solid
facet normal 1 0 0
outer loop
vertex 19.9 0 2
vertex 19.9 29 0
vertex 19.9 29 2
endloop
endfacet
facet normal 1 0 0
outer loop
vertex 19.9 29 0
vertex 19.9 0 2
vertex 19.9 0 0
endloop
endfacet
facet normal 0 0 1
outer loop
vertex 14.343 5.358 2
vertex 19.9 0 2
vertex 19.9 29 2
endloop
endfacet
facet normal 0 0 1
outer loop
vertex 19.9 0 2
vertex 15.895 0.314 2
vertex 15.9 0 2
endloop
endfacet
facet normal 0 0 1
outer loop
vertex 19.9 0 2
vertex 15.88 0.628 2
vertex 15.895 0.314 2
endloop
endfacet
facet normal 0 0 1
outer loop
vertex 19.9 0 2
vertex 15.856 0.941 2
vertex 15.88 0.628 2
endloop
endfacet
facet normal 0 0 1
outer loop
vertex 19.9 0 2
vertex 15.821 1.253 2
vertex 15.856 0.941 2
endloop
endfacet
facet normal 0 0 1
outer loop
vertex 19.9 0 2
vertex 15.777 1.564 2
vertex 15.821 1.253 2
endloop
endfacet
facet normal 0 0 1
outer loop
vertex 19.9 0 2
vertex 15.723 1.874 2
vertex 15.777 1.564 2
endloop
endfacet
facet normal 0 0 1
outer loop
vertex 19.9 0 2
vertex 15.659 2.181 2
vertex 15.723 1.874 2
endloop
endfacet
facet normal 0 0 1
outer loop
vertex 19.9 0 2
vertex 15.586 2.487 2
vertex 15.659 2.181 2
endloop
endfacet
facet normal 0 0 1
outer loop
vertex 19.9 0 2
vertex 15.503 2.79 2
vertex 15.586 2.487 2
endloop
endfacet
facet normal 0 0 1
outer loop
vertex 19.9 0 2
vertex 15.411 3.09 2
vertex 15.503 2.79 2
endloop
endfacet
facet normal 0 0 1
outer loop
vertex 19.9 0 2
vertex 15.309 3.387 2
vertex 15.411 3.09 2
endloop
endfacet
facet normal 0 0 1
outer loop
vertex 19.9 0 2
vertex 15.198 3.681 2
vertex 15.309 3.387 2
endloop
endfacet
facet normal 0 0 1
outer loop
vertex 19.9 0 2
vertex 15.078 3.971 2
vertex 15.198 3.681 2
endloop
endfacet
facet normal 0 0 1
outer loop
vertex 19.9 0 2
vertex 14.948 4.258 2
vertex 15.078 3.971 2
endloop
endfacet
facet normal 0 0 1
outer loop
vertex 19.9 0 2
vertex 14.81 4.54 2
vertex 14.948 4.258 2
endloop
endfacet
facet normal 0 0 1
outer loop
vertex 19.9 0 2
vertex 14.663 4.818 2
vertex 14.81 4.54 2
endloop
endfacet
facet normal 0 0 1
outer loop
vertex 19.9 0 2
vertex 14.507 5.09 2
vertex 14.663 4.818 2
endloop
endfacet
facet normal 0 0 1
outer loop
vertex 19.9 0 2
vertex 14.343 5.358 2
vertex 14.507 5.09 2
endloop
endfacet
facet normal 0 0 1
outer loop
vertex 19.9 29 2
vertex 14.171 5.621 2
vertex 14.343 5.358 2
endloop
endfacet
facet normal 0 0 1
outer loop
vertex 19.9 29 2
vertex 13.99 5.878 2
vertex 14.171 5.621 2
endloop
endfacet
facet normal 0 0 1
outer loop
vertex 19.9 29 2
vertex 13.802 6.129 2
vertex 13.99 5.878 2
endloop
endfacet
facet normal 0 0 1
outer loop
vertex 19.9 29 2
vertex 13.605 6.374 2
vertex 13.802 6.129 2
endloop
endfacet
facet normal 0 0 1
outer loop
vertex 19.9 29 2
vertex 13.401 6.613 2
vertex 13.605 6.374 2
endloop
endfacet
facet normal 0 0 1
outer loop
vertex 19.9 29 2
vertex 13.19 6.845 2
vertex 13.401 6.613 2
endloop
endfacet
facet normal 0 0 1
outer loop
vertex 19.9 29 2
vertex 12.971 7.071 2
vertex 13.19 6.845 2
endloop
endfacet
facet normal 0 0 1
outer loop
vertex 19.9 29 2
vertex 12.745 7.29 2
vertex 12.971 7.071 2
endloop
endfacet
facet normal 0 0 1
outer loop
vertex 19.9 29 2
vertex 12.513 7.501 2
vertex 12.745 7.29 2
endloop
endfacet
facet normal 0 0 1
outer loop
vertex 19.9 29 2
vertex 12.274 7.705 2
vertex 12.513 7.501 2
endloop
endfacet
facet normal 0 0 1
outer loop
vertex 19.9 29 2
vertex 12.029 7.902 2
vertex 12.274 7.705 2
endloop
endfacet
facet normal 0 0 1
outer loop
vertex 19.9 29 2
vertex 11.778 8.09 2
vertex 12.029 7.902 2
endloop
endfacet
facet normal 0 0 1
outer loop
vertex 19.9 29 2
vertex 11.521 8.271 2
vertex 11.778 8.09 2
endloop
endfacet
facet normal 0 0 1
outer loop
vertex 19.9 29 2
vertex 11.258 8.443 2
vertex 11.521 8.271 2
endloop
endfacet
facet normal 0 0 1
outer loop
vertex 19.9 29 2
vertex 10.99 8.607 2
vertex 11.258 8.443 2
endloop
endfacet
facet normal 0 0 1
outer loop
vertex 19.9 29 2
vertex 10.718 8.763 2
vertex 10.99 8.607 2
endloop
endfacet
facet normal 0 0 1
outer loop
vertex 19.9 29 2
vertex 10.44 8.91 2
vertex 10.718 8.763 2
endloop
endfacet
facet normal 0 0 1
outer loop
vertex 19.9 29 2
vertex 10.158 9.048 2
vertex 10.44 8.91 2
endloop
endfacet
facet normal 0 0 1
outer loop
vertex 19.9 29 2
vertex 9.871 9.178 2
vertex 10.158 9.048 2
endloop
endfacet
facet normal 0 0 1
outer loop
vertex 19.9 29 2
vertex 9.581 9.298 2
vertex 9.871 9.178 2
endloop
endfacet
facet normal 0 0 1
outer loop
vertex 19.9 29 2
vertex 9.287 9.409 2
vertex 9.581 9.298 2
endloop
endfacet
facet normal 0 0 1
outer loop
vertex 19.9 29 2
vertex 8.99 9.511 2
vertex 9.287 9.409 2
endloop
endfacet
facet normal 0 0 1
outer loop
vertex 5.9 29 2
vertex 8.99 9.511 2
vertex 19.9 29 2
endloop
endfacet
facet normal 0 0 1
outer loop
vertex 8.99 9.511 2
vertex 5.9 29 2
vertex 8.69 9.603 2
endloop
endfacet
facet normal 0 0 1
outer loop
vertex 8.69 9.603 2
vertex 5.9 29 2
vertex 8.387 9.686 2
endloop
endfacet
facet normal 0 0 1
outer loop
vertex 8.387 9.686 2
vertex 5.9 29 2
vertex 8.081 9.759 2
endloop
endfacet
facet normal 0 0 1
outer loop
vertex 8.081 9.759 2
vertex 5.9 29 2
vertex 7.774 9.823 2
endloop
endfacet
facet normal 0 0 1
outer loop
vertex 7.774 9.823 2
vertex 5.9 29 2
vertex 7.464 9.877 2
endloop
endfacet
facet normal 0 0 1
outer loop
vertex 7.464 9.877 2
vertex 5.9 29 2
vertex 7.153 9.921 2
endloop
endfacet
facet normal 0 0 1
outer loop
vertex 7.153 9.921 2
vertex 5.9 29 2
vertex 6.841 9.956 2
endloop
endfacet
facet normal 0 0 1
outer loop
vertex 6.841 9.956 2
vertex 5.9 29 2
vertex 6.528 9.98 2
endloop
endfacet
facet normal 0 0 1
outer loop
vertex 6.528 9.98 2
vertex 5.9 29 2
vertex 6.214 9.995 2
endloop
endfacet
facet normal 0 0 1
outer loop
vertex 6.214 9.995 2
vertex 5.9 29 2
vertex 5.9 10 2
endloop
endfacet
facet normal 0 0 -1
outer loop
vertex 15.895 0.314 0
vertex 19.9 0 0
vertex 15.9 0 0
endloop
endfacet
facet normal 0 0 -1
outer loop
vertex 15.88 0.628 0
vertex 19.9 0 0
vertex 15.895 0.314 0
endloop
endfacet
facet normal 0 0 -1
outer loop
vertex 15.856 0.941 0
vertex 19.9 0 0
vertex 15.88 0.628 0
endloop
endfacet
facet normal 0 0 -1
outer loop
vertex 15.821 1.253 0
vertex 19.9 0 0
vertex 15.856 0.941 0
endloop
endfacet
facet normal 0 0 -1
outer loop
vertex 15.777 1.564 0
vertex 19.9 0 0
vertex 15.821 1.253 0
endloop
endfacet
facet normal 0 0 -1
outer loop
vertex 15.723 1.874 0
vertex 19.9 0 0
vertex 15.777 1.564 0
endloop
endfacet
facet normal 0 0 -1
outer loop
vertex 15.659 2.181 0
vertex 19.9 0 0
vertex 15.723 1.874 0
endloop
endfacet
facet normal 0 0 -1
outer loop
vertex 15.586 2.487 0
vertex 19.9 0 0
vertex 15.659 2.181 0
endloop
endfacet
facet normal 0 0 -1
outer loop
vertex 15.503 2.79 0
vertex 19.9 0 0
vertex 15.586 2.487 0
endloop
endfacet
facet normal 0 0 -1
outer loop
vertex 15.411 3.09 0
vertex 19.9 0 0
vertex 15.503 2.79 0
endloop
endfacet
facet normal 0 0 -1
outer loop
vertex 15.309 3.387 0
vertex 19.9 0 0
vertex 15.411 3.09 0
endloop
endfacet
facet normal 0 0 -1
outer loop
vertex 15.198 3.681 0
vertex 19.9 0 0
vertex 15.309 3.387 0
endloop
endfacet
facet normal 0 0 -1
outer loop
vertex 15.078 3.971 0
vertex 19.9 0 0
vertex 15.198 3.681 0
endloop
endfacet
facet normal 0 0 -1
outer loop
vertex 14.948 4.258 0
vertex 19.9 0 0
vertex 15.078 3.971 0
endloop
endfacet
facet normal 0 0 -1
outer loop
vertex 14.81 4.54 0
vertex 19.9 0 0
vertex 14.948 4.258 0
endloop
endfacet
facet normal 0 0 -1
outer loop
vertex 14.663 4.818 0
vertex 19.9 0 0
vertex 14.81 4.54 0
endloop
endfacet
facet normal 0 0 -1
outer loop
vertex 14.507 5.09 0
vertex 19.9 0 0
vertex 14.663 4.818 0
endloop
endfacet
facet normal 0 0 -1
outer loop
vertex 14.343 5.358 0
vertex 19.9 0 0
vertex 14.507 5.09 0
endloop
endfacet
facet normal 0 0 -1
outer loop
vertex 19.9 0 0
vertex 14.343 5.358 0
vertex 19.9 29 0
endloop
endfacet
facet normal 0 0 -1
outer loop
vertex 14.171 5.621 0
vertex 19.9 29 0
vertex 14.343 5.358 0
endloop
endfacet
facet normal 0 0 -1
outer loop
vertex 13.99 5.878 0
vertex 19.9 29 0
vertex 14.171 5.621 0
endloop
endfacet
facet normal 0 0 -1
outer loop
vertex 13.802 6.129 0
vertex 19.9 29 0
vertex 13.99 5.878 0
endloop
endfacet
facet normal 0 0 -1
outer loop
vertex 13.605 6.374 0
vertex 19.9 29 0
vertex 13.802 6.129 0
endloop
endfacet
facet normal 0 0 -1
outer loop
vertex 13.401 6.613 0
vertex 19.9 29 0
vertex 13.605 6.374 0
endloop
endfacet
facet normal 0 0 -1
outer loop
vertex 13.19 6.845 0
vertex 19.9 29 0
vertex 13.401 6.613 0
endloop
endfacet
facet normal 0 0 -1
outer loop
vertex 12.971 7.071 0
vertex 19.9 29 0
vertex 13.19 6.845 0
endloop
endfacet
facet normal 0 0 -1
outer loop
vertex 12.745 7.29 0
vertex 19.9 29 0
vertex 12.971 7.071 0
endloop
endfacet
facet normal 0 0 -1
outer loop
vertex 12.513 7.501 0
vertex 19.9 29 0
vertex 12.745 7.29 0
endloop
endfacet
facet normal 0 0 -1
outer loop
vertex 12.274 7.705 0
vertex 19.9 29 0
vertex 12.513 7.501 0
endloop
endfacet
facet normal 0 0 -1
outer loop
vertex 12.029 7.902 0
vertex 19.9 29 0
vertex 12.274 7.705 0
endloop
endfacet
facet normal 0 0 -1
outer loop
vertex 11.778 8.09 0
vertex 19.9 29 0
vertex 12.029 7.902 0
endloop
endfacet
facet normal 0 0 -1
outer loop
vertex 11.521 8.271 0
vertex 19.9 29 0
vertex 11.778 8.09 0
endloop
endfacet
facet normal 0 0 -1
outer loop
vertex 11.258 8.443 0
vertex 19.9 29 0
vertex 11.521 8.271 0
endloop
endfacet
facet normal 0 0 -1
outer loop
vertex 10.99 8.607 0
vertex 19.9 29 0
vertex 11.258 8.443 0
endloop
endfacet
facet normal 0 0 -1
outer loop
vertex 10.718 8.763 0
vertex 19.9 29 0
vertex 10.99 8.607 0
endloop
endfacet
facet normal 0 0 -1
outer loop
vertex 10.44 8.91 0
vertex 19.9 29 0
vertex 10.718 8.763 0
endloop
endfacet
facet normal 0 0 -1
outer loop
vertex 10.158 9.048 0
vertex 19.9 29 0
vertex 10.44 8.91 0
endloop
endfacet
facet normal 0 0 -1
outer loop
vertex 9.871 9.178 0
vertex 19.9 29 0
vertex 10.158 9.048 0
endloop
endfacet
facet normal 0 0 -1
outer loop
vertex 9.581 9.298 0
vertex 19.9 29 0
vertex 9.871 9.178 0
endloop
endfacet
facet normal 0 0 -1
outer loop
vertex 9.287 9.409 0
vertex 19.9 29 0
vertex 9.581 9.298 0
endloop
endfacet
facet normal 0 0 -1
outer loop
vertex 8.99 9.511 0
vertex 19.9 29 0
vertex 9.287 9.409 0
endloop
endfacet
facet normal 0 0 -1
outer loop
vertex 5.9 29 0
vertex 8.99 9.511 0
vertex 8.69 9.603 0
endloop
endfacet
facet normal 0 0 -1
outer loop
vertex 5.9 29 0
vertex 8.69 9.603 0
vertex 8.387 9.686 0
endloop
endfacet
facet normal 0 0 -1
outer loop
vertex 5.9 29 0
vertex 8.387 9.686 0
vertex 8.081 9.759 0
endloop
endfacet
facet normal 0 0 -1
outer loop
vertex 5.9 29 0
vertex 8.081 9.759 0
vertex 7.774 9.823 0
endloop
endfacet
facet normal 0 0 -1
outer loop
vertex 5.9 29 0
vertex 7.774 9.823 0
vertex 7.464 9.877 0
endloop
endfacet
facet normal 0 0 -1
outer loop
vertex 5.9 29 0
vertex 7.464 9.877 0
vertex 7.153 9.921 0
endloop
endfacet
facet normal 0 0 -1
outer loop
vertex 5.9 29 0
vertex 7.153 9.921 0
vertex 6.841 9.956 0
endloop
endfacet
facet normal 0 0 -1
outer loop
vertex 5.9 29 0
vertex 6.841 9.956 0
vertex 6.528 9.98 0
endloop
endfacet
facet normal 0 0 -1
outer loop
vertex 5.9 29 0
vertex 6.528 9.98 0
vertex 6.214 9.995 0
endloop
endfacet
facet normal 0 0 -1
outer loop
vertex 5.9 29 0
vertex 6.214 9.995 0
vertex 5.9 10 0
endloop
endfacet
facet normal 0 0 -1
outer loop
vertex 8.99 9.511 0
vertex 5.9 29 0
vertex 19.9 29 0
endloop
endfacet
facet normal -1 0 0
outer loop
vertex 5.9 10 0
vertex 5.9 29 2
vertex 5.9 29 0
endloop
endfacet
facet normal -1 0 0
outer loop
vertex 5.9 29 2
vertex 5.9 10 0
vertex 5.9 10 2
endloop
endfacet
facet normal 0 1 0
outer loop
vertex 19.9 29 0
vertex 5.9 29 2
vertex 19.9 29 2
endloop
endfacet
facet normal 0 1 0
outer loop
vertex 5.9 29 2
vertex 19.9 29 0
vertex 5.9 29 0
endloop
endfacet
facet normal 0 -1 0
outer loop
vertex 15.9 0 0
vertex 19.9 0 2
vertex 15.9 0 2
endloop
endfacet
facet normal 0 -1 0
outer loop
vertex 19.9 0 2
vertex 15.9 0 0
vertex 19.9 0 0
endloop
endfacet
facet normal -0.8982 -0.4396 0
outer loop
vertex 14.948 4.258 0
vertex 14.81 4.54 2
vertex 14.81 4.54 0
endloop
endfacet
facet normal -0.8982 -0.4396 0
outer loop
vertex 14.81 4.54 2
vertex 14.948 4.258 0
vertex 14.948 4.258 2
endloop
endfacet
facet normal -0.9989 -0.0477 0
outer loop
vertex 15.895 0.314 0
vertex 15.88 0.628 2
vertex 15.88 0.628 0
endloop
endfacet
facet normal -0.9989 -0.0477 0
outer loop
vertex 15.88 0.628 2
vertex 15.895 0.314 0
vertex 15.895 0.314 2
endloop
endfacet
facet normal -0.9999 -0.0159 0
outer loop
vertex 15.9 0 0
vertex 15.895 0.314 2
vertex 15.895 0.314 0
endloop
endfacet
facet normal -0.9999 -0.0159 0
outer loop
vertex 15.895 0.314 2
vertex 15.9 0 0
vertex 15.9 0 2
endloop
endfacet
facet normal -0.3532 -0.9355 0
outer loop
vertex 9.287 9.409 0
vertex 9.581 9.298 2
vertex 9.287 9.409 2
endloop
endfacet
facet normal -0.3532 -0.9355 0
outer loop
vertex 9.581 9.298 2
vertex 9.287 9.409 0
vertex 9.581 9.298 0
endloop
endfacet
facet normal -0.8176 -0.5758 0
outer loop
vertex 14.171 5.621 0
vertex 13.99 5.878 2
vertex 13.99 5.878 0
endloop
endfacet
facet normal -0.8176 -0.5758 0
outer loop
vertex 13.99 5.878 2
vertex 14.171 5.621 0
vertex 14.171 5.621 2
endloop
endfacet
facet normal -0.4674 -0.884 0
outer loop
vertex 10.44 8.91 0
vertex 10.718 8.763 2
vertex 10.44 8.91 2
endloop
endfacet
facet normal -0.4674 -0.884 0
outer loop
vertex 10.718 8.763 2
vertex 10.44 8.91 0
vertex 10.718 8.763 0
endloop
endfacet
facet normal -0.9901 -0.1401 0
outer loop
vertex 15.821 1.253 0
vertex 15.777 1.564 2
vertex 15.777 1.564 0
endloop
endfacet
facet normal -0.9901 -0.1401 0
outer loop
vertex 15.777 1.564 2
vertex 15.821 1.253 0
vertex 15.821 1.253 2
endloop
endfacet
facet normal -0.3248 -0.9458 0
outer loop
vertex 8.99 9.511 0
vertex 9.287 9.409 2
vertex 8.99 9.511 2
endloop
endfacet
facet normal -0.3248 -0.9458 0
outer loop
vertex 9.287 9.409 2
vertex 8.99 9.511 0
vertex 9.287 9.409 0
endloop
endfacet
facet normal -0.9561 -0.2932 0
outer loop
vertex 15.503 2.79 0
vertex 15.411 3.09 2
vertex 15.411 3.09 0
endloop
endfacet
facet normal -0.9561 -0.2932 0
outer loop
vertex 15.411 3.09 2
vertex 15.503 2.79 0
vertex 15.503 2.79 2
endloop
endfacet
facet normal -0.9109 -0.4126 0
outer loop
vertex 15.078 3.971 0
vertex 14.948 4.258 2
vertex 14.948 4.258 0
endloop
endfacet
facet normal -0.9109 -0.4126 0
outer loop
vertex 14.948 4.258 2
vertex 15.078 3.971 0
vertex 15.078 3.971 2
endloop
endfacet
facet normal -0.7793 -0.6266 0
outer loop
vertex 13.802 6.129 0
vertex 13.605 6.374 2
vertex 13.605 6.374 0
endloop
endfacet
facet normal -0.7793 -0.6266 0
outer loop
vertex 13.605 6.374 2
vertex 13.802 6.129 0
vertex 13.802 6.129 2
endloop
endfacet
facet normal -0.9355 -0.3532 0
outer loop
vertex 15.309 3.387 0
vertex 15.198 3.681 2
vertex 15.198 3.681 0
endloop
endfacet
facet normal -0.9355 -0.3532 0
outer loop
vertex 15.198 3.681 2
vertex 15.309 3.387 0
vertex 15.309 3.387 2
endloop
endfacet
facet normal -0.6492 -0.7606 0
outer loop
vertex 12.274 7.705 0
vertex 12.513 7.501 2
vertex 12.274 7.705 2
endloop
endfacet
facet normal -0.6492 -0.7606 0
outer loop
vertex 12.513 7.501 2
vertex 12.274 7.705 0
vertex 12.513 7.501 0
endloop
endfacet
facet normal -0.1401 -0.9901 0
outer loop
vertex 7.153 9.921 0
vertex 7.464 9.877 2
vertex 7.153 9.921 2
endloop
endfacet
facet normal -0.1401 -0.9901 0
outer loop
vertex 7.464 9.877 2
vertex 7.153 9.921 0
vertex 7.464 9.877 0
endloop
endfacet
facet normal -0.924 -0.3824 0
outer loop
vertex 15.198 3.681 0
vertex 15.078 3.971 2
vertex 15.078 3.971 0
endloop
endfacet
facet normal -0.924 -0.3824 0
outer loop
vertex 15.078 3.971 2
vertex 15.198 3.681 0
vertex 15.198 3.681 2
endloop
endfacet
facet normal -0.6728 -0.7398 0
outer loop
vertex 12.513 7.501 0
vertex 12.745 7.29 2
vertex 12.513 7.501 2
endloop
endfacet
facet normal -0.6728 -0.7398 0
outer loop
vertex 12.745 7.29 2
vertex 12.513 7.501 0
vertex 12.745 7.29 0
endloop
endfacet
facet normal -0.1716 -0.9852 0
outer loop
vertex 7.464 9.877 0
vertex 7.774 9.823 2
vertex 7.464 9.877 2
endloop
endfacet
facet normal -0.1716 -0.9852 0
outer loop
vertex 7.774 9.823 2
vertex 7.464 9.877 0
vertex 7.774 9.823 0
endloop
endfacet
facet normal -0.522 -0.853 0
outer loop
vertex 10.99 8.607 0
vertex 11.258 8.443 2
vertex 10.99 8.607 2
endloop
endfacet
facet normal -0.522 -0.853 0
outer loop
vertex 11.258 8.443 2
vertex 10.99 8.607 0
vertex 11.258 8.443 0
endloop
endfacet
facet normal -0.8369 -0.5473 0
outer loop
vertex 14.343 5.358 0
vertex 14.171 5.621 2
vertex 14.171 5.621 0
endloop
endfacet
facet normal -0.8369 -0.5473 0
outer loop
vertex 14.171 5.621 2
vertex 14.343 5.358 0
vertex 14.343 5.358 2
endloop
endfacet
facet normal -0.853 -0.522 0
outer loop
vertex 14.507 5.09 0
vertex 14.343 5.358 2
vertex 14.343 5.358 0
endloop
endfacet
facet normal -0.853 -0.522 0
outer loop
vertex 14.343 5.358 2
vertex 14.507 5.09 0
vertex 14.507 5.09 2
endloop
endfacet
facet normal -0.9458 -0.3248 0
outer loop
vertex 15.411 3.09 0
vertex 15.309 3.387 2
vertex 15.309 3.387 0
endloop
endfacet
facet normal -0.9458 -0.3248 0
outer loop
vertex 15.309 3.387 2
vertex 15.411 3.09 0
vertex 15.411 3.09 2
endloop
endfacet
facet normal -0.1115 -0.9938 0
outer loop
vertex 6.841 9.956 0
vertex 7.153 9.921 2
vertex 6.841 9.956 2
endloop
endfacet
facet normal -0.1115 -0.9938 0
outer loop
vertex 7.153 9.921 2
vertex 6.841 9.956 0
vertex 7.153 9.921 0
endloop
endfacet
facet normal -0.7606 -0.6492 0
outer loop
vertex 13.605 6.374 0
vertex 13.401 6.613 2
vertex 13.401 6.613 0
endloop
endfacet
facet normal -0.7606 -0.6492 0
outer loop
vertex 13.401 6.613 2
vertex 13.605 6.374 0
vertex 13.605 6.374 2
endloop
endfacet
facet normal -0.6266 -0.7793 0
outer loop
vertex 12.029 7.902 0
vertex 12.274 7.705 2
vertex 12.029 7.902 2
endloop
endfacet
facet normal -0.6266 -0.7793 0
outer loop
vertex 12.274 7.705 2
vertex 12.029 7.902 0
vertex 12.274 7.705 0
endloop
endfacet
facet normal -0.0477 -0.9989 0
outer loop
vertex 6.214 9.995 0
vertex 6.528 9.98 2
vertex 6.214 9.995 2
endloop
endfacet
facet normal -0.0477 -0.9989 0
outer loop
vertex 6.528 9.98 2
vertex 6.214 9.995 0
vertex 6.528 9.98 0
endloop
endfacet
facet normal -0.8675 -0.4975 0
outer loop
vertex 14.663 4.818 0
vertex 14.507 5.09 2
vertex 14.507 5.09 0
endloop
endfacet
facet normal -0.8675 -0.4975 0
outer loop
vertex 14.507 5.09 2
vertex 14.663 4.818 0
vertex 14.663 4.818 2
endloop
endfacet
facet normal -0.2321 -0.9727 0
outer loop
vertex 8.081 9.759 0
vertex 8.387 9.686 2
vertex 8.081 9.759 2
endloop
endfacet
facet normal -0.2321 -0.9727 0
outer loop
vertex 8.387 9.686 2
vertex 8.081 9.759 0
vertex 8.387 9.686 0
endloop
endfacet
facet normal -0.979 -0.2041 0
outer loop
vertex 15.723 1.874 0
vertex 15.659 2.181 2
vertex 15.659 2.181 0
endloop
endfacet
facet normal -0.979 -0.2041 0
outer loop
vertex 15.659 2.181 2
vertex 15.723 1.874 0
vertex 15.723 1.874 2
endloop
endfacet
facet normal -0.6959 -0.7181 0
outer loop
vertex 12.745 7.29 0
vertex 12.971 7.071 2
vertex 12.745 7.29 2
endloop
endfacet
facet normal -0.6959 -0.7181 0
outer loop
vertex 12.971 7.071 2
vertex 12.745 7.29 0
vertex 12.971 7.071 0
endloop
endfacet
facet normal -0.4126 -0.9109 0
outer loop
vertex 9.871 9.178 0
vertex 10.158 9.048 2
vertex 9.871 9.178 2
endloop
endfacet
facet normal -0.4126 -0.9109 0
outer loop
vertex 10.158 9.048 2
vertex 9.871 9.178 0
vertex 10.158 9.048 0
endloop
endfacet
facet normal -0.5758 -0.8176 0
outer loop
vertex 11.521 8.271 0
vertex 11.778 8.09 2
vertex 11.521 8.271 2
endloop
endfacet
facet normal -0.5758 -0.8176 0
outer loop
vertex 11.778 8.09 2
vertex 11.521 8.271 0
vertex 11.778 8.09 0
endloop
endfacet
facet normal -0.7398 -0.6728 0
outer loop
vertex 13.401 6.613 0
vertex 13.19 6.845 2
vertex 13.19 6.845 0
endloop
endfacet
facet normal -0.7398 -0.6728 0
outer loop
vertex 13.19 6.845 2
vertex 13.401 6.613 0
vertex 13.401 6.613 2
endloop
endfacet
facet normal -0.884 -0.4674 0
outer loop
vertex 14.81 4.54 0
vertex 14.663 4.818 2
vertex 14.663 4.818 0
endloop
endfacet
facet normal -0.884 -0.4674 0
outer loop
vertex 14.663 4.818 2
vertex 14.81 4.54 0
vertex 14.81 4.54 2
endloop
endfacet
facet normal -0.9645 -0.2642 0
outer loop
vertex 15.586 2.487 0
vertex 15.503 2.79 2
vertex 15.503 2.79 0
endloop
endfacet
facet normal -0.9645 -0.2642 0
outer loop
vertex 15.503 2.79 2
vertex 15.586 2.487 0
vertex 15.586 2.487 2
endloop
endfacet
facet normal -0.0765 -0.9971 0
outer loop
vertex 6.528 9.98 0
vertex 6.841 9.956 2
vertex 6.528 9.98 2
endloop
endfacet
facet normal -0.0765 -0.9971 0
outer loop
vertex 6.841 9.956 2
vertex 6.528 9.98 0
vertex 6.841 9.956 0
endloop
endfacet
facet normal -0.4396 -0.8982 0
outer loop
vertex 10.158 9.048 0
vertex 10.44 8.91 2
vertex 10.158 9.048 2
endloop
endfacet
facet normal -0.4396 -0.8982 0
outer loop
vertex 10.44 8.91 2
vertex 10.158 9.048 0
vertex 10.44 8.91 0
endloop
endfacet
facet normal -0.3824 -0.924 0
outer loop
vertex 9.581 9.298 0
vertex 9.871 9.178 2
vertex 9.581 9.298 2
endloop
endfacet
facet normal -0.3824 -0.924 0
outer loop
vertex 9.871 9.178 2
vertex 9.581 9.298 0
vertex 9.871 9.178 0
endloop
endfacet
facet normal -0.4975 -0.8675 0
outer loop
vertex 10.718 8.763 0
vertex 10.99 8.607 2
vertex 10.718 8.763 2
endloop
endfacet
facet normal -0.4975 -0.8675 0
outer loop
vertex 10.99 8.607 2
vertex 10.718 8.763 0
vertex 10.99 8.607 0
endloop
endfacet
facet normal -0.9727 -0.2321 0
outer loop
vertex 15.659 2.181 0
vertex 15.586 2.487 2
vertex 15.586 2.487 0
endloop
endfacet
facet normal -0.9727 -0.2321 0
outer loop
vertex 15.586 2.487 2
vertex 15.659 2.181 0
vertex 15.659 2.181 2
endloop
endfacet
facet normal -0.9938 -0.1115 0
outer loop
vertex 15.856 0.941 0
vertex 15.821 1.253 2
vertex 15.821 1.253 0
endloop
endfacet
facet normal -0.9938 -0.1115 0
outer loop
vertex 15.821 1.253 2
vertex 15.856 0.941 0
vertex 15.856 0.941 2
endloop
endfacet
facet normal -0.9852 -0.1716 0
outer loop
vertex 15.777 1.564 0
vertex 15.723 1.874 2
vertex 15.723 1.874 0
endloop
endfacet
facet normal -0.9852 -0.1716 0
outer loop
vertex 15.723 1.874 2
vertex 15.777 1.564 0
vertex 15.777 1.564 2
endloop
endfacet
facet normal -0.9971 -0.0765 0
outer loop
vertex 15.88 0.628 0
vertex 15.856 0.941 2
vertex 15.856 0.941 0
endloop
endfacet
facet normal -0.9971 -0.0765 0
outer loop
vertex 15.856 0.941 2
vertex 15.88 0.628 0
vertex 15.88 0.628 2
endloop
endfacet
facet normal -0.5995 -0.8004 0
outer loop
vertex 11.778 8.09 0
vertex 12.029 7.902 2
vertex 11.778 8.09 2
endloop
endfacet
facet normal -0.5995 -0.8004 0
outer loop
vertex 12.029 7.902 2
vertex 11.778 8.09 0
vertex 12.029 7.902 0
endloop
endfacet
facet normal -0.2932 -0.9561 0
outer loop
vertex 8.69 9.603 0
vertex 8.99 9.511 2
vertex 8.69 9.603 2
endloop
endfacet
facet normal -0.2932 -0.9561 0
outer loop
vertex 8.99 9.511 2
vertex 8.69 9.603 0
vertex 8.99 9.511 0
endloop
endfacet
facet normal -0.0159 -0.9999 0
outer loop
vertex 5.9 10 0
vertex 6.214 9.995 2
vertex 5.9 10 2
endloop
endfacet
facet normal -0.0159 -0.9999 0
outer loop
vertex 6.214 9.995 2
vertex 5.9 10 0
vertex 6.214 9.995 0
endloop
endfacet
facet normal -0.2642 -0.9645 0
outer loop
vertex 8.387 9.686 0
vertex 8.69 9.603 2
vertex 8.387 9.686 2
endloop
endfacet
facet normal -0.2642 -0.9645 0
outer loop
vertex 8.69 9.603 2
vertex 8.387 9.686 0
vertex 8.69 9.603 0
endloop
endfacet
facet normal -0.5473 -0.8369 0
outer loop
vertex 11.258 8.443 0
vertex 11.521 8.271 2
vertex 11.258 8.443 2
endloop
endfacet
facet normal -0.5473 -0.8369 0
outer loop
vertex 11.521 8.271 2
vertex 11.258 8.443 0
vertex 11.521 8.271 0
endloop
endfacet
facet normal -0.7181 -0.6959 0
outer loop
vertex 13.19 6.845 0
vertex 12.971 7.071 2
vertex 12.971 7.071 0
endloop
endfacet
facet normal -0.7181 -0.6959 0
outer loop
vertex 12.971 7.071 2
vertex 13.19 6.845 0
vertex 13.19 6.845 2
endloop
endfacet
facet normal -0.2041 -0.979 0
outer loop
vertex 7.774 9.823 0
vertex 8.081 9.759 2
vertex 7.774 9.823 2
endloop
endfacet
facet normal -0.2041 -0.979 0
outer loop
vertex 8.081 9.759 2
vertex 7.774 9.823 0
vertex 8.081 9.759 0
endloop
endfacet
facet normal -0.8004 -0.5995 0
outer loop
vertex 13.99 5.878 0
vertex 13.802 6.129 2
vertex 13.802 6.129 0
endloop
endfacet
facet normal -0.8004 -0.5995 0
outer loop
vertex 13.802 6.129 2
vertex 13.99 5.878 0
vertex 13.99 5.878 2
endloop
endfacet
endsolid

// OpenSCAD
translate([5.9,0,0]){
difference() {
cube(size=[14,29,2],center=false);
cylinder(h=4,r=2.,$fn=200,center=false);
cylinder(h=4,r=10.,$fn=200,center=false);
cylinder(h=2.,r=1.,$fn=200,center=false);
}
}
